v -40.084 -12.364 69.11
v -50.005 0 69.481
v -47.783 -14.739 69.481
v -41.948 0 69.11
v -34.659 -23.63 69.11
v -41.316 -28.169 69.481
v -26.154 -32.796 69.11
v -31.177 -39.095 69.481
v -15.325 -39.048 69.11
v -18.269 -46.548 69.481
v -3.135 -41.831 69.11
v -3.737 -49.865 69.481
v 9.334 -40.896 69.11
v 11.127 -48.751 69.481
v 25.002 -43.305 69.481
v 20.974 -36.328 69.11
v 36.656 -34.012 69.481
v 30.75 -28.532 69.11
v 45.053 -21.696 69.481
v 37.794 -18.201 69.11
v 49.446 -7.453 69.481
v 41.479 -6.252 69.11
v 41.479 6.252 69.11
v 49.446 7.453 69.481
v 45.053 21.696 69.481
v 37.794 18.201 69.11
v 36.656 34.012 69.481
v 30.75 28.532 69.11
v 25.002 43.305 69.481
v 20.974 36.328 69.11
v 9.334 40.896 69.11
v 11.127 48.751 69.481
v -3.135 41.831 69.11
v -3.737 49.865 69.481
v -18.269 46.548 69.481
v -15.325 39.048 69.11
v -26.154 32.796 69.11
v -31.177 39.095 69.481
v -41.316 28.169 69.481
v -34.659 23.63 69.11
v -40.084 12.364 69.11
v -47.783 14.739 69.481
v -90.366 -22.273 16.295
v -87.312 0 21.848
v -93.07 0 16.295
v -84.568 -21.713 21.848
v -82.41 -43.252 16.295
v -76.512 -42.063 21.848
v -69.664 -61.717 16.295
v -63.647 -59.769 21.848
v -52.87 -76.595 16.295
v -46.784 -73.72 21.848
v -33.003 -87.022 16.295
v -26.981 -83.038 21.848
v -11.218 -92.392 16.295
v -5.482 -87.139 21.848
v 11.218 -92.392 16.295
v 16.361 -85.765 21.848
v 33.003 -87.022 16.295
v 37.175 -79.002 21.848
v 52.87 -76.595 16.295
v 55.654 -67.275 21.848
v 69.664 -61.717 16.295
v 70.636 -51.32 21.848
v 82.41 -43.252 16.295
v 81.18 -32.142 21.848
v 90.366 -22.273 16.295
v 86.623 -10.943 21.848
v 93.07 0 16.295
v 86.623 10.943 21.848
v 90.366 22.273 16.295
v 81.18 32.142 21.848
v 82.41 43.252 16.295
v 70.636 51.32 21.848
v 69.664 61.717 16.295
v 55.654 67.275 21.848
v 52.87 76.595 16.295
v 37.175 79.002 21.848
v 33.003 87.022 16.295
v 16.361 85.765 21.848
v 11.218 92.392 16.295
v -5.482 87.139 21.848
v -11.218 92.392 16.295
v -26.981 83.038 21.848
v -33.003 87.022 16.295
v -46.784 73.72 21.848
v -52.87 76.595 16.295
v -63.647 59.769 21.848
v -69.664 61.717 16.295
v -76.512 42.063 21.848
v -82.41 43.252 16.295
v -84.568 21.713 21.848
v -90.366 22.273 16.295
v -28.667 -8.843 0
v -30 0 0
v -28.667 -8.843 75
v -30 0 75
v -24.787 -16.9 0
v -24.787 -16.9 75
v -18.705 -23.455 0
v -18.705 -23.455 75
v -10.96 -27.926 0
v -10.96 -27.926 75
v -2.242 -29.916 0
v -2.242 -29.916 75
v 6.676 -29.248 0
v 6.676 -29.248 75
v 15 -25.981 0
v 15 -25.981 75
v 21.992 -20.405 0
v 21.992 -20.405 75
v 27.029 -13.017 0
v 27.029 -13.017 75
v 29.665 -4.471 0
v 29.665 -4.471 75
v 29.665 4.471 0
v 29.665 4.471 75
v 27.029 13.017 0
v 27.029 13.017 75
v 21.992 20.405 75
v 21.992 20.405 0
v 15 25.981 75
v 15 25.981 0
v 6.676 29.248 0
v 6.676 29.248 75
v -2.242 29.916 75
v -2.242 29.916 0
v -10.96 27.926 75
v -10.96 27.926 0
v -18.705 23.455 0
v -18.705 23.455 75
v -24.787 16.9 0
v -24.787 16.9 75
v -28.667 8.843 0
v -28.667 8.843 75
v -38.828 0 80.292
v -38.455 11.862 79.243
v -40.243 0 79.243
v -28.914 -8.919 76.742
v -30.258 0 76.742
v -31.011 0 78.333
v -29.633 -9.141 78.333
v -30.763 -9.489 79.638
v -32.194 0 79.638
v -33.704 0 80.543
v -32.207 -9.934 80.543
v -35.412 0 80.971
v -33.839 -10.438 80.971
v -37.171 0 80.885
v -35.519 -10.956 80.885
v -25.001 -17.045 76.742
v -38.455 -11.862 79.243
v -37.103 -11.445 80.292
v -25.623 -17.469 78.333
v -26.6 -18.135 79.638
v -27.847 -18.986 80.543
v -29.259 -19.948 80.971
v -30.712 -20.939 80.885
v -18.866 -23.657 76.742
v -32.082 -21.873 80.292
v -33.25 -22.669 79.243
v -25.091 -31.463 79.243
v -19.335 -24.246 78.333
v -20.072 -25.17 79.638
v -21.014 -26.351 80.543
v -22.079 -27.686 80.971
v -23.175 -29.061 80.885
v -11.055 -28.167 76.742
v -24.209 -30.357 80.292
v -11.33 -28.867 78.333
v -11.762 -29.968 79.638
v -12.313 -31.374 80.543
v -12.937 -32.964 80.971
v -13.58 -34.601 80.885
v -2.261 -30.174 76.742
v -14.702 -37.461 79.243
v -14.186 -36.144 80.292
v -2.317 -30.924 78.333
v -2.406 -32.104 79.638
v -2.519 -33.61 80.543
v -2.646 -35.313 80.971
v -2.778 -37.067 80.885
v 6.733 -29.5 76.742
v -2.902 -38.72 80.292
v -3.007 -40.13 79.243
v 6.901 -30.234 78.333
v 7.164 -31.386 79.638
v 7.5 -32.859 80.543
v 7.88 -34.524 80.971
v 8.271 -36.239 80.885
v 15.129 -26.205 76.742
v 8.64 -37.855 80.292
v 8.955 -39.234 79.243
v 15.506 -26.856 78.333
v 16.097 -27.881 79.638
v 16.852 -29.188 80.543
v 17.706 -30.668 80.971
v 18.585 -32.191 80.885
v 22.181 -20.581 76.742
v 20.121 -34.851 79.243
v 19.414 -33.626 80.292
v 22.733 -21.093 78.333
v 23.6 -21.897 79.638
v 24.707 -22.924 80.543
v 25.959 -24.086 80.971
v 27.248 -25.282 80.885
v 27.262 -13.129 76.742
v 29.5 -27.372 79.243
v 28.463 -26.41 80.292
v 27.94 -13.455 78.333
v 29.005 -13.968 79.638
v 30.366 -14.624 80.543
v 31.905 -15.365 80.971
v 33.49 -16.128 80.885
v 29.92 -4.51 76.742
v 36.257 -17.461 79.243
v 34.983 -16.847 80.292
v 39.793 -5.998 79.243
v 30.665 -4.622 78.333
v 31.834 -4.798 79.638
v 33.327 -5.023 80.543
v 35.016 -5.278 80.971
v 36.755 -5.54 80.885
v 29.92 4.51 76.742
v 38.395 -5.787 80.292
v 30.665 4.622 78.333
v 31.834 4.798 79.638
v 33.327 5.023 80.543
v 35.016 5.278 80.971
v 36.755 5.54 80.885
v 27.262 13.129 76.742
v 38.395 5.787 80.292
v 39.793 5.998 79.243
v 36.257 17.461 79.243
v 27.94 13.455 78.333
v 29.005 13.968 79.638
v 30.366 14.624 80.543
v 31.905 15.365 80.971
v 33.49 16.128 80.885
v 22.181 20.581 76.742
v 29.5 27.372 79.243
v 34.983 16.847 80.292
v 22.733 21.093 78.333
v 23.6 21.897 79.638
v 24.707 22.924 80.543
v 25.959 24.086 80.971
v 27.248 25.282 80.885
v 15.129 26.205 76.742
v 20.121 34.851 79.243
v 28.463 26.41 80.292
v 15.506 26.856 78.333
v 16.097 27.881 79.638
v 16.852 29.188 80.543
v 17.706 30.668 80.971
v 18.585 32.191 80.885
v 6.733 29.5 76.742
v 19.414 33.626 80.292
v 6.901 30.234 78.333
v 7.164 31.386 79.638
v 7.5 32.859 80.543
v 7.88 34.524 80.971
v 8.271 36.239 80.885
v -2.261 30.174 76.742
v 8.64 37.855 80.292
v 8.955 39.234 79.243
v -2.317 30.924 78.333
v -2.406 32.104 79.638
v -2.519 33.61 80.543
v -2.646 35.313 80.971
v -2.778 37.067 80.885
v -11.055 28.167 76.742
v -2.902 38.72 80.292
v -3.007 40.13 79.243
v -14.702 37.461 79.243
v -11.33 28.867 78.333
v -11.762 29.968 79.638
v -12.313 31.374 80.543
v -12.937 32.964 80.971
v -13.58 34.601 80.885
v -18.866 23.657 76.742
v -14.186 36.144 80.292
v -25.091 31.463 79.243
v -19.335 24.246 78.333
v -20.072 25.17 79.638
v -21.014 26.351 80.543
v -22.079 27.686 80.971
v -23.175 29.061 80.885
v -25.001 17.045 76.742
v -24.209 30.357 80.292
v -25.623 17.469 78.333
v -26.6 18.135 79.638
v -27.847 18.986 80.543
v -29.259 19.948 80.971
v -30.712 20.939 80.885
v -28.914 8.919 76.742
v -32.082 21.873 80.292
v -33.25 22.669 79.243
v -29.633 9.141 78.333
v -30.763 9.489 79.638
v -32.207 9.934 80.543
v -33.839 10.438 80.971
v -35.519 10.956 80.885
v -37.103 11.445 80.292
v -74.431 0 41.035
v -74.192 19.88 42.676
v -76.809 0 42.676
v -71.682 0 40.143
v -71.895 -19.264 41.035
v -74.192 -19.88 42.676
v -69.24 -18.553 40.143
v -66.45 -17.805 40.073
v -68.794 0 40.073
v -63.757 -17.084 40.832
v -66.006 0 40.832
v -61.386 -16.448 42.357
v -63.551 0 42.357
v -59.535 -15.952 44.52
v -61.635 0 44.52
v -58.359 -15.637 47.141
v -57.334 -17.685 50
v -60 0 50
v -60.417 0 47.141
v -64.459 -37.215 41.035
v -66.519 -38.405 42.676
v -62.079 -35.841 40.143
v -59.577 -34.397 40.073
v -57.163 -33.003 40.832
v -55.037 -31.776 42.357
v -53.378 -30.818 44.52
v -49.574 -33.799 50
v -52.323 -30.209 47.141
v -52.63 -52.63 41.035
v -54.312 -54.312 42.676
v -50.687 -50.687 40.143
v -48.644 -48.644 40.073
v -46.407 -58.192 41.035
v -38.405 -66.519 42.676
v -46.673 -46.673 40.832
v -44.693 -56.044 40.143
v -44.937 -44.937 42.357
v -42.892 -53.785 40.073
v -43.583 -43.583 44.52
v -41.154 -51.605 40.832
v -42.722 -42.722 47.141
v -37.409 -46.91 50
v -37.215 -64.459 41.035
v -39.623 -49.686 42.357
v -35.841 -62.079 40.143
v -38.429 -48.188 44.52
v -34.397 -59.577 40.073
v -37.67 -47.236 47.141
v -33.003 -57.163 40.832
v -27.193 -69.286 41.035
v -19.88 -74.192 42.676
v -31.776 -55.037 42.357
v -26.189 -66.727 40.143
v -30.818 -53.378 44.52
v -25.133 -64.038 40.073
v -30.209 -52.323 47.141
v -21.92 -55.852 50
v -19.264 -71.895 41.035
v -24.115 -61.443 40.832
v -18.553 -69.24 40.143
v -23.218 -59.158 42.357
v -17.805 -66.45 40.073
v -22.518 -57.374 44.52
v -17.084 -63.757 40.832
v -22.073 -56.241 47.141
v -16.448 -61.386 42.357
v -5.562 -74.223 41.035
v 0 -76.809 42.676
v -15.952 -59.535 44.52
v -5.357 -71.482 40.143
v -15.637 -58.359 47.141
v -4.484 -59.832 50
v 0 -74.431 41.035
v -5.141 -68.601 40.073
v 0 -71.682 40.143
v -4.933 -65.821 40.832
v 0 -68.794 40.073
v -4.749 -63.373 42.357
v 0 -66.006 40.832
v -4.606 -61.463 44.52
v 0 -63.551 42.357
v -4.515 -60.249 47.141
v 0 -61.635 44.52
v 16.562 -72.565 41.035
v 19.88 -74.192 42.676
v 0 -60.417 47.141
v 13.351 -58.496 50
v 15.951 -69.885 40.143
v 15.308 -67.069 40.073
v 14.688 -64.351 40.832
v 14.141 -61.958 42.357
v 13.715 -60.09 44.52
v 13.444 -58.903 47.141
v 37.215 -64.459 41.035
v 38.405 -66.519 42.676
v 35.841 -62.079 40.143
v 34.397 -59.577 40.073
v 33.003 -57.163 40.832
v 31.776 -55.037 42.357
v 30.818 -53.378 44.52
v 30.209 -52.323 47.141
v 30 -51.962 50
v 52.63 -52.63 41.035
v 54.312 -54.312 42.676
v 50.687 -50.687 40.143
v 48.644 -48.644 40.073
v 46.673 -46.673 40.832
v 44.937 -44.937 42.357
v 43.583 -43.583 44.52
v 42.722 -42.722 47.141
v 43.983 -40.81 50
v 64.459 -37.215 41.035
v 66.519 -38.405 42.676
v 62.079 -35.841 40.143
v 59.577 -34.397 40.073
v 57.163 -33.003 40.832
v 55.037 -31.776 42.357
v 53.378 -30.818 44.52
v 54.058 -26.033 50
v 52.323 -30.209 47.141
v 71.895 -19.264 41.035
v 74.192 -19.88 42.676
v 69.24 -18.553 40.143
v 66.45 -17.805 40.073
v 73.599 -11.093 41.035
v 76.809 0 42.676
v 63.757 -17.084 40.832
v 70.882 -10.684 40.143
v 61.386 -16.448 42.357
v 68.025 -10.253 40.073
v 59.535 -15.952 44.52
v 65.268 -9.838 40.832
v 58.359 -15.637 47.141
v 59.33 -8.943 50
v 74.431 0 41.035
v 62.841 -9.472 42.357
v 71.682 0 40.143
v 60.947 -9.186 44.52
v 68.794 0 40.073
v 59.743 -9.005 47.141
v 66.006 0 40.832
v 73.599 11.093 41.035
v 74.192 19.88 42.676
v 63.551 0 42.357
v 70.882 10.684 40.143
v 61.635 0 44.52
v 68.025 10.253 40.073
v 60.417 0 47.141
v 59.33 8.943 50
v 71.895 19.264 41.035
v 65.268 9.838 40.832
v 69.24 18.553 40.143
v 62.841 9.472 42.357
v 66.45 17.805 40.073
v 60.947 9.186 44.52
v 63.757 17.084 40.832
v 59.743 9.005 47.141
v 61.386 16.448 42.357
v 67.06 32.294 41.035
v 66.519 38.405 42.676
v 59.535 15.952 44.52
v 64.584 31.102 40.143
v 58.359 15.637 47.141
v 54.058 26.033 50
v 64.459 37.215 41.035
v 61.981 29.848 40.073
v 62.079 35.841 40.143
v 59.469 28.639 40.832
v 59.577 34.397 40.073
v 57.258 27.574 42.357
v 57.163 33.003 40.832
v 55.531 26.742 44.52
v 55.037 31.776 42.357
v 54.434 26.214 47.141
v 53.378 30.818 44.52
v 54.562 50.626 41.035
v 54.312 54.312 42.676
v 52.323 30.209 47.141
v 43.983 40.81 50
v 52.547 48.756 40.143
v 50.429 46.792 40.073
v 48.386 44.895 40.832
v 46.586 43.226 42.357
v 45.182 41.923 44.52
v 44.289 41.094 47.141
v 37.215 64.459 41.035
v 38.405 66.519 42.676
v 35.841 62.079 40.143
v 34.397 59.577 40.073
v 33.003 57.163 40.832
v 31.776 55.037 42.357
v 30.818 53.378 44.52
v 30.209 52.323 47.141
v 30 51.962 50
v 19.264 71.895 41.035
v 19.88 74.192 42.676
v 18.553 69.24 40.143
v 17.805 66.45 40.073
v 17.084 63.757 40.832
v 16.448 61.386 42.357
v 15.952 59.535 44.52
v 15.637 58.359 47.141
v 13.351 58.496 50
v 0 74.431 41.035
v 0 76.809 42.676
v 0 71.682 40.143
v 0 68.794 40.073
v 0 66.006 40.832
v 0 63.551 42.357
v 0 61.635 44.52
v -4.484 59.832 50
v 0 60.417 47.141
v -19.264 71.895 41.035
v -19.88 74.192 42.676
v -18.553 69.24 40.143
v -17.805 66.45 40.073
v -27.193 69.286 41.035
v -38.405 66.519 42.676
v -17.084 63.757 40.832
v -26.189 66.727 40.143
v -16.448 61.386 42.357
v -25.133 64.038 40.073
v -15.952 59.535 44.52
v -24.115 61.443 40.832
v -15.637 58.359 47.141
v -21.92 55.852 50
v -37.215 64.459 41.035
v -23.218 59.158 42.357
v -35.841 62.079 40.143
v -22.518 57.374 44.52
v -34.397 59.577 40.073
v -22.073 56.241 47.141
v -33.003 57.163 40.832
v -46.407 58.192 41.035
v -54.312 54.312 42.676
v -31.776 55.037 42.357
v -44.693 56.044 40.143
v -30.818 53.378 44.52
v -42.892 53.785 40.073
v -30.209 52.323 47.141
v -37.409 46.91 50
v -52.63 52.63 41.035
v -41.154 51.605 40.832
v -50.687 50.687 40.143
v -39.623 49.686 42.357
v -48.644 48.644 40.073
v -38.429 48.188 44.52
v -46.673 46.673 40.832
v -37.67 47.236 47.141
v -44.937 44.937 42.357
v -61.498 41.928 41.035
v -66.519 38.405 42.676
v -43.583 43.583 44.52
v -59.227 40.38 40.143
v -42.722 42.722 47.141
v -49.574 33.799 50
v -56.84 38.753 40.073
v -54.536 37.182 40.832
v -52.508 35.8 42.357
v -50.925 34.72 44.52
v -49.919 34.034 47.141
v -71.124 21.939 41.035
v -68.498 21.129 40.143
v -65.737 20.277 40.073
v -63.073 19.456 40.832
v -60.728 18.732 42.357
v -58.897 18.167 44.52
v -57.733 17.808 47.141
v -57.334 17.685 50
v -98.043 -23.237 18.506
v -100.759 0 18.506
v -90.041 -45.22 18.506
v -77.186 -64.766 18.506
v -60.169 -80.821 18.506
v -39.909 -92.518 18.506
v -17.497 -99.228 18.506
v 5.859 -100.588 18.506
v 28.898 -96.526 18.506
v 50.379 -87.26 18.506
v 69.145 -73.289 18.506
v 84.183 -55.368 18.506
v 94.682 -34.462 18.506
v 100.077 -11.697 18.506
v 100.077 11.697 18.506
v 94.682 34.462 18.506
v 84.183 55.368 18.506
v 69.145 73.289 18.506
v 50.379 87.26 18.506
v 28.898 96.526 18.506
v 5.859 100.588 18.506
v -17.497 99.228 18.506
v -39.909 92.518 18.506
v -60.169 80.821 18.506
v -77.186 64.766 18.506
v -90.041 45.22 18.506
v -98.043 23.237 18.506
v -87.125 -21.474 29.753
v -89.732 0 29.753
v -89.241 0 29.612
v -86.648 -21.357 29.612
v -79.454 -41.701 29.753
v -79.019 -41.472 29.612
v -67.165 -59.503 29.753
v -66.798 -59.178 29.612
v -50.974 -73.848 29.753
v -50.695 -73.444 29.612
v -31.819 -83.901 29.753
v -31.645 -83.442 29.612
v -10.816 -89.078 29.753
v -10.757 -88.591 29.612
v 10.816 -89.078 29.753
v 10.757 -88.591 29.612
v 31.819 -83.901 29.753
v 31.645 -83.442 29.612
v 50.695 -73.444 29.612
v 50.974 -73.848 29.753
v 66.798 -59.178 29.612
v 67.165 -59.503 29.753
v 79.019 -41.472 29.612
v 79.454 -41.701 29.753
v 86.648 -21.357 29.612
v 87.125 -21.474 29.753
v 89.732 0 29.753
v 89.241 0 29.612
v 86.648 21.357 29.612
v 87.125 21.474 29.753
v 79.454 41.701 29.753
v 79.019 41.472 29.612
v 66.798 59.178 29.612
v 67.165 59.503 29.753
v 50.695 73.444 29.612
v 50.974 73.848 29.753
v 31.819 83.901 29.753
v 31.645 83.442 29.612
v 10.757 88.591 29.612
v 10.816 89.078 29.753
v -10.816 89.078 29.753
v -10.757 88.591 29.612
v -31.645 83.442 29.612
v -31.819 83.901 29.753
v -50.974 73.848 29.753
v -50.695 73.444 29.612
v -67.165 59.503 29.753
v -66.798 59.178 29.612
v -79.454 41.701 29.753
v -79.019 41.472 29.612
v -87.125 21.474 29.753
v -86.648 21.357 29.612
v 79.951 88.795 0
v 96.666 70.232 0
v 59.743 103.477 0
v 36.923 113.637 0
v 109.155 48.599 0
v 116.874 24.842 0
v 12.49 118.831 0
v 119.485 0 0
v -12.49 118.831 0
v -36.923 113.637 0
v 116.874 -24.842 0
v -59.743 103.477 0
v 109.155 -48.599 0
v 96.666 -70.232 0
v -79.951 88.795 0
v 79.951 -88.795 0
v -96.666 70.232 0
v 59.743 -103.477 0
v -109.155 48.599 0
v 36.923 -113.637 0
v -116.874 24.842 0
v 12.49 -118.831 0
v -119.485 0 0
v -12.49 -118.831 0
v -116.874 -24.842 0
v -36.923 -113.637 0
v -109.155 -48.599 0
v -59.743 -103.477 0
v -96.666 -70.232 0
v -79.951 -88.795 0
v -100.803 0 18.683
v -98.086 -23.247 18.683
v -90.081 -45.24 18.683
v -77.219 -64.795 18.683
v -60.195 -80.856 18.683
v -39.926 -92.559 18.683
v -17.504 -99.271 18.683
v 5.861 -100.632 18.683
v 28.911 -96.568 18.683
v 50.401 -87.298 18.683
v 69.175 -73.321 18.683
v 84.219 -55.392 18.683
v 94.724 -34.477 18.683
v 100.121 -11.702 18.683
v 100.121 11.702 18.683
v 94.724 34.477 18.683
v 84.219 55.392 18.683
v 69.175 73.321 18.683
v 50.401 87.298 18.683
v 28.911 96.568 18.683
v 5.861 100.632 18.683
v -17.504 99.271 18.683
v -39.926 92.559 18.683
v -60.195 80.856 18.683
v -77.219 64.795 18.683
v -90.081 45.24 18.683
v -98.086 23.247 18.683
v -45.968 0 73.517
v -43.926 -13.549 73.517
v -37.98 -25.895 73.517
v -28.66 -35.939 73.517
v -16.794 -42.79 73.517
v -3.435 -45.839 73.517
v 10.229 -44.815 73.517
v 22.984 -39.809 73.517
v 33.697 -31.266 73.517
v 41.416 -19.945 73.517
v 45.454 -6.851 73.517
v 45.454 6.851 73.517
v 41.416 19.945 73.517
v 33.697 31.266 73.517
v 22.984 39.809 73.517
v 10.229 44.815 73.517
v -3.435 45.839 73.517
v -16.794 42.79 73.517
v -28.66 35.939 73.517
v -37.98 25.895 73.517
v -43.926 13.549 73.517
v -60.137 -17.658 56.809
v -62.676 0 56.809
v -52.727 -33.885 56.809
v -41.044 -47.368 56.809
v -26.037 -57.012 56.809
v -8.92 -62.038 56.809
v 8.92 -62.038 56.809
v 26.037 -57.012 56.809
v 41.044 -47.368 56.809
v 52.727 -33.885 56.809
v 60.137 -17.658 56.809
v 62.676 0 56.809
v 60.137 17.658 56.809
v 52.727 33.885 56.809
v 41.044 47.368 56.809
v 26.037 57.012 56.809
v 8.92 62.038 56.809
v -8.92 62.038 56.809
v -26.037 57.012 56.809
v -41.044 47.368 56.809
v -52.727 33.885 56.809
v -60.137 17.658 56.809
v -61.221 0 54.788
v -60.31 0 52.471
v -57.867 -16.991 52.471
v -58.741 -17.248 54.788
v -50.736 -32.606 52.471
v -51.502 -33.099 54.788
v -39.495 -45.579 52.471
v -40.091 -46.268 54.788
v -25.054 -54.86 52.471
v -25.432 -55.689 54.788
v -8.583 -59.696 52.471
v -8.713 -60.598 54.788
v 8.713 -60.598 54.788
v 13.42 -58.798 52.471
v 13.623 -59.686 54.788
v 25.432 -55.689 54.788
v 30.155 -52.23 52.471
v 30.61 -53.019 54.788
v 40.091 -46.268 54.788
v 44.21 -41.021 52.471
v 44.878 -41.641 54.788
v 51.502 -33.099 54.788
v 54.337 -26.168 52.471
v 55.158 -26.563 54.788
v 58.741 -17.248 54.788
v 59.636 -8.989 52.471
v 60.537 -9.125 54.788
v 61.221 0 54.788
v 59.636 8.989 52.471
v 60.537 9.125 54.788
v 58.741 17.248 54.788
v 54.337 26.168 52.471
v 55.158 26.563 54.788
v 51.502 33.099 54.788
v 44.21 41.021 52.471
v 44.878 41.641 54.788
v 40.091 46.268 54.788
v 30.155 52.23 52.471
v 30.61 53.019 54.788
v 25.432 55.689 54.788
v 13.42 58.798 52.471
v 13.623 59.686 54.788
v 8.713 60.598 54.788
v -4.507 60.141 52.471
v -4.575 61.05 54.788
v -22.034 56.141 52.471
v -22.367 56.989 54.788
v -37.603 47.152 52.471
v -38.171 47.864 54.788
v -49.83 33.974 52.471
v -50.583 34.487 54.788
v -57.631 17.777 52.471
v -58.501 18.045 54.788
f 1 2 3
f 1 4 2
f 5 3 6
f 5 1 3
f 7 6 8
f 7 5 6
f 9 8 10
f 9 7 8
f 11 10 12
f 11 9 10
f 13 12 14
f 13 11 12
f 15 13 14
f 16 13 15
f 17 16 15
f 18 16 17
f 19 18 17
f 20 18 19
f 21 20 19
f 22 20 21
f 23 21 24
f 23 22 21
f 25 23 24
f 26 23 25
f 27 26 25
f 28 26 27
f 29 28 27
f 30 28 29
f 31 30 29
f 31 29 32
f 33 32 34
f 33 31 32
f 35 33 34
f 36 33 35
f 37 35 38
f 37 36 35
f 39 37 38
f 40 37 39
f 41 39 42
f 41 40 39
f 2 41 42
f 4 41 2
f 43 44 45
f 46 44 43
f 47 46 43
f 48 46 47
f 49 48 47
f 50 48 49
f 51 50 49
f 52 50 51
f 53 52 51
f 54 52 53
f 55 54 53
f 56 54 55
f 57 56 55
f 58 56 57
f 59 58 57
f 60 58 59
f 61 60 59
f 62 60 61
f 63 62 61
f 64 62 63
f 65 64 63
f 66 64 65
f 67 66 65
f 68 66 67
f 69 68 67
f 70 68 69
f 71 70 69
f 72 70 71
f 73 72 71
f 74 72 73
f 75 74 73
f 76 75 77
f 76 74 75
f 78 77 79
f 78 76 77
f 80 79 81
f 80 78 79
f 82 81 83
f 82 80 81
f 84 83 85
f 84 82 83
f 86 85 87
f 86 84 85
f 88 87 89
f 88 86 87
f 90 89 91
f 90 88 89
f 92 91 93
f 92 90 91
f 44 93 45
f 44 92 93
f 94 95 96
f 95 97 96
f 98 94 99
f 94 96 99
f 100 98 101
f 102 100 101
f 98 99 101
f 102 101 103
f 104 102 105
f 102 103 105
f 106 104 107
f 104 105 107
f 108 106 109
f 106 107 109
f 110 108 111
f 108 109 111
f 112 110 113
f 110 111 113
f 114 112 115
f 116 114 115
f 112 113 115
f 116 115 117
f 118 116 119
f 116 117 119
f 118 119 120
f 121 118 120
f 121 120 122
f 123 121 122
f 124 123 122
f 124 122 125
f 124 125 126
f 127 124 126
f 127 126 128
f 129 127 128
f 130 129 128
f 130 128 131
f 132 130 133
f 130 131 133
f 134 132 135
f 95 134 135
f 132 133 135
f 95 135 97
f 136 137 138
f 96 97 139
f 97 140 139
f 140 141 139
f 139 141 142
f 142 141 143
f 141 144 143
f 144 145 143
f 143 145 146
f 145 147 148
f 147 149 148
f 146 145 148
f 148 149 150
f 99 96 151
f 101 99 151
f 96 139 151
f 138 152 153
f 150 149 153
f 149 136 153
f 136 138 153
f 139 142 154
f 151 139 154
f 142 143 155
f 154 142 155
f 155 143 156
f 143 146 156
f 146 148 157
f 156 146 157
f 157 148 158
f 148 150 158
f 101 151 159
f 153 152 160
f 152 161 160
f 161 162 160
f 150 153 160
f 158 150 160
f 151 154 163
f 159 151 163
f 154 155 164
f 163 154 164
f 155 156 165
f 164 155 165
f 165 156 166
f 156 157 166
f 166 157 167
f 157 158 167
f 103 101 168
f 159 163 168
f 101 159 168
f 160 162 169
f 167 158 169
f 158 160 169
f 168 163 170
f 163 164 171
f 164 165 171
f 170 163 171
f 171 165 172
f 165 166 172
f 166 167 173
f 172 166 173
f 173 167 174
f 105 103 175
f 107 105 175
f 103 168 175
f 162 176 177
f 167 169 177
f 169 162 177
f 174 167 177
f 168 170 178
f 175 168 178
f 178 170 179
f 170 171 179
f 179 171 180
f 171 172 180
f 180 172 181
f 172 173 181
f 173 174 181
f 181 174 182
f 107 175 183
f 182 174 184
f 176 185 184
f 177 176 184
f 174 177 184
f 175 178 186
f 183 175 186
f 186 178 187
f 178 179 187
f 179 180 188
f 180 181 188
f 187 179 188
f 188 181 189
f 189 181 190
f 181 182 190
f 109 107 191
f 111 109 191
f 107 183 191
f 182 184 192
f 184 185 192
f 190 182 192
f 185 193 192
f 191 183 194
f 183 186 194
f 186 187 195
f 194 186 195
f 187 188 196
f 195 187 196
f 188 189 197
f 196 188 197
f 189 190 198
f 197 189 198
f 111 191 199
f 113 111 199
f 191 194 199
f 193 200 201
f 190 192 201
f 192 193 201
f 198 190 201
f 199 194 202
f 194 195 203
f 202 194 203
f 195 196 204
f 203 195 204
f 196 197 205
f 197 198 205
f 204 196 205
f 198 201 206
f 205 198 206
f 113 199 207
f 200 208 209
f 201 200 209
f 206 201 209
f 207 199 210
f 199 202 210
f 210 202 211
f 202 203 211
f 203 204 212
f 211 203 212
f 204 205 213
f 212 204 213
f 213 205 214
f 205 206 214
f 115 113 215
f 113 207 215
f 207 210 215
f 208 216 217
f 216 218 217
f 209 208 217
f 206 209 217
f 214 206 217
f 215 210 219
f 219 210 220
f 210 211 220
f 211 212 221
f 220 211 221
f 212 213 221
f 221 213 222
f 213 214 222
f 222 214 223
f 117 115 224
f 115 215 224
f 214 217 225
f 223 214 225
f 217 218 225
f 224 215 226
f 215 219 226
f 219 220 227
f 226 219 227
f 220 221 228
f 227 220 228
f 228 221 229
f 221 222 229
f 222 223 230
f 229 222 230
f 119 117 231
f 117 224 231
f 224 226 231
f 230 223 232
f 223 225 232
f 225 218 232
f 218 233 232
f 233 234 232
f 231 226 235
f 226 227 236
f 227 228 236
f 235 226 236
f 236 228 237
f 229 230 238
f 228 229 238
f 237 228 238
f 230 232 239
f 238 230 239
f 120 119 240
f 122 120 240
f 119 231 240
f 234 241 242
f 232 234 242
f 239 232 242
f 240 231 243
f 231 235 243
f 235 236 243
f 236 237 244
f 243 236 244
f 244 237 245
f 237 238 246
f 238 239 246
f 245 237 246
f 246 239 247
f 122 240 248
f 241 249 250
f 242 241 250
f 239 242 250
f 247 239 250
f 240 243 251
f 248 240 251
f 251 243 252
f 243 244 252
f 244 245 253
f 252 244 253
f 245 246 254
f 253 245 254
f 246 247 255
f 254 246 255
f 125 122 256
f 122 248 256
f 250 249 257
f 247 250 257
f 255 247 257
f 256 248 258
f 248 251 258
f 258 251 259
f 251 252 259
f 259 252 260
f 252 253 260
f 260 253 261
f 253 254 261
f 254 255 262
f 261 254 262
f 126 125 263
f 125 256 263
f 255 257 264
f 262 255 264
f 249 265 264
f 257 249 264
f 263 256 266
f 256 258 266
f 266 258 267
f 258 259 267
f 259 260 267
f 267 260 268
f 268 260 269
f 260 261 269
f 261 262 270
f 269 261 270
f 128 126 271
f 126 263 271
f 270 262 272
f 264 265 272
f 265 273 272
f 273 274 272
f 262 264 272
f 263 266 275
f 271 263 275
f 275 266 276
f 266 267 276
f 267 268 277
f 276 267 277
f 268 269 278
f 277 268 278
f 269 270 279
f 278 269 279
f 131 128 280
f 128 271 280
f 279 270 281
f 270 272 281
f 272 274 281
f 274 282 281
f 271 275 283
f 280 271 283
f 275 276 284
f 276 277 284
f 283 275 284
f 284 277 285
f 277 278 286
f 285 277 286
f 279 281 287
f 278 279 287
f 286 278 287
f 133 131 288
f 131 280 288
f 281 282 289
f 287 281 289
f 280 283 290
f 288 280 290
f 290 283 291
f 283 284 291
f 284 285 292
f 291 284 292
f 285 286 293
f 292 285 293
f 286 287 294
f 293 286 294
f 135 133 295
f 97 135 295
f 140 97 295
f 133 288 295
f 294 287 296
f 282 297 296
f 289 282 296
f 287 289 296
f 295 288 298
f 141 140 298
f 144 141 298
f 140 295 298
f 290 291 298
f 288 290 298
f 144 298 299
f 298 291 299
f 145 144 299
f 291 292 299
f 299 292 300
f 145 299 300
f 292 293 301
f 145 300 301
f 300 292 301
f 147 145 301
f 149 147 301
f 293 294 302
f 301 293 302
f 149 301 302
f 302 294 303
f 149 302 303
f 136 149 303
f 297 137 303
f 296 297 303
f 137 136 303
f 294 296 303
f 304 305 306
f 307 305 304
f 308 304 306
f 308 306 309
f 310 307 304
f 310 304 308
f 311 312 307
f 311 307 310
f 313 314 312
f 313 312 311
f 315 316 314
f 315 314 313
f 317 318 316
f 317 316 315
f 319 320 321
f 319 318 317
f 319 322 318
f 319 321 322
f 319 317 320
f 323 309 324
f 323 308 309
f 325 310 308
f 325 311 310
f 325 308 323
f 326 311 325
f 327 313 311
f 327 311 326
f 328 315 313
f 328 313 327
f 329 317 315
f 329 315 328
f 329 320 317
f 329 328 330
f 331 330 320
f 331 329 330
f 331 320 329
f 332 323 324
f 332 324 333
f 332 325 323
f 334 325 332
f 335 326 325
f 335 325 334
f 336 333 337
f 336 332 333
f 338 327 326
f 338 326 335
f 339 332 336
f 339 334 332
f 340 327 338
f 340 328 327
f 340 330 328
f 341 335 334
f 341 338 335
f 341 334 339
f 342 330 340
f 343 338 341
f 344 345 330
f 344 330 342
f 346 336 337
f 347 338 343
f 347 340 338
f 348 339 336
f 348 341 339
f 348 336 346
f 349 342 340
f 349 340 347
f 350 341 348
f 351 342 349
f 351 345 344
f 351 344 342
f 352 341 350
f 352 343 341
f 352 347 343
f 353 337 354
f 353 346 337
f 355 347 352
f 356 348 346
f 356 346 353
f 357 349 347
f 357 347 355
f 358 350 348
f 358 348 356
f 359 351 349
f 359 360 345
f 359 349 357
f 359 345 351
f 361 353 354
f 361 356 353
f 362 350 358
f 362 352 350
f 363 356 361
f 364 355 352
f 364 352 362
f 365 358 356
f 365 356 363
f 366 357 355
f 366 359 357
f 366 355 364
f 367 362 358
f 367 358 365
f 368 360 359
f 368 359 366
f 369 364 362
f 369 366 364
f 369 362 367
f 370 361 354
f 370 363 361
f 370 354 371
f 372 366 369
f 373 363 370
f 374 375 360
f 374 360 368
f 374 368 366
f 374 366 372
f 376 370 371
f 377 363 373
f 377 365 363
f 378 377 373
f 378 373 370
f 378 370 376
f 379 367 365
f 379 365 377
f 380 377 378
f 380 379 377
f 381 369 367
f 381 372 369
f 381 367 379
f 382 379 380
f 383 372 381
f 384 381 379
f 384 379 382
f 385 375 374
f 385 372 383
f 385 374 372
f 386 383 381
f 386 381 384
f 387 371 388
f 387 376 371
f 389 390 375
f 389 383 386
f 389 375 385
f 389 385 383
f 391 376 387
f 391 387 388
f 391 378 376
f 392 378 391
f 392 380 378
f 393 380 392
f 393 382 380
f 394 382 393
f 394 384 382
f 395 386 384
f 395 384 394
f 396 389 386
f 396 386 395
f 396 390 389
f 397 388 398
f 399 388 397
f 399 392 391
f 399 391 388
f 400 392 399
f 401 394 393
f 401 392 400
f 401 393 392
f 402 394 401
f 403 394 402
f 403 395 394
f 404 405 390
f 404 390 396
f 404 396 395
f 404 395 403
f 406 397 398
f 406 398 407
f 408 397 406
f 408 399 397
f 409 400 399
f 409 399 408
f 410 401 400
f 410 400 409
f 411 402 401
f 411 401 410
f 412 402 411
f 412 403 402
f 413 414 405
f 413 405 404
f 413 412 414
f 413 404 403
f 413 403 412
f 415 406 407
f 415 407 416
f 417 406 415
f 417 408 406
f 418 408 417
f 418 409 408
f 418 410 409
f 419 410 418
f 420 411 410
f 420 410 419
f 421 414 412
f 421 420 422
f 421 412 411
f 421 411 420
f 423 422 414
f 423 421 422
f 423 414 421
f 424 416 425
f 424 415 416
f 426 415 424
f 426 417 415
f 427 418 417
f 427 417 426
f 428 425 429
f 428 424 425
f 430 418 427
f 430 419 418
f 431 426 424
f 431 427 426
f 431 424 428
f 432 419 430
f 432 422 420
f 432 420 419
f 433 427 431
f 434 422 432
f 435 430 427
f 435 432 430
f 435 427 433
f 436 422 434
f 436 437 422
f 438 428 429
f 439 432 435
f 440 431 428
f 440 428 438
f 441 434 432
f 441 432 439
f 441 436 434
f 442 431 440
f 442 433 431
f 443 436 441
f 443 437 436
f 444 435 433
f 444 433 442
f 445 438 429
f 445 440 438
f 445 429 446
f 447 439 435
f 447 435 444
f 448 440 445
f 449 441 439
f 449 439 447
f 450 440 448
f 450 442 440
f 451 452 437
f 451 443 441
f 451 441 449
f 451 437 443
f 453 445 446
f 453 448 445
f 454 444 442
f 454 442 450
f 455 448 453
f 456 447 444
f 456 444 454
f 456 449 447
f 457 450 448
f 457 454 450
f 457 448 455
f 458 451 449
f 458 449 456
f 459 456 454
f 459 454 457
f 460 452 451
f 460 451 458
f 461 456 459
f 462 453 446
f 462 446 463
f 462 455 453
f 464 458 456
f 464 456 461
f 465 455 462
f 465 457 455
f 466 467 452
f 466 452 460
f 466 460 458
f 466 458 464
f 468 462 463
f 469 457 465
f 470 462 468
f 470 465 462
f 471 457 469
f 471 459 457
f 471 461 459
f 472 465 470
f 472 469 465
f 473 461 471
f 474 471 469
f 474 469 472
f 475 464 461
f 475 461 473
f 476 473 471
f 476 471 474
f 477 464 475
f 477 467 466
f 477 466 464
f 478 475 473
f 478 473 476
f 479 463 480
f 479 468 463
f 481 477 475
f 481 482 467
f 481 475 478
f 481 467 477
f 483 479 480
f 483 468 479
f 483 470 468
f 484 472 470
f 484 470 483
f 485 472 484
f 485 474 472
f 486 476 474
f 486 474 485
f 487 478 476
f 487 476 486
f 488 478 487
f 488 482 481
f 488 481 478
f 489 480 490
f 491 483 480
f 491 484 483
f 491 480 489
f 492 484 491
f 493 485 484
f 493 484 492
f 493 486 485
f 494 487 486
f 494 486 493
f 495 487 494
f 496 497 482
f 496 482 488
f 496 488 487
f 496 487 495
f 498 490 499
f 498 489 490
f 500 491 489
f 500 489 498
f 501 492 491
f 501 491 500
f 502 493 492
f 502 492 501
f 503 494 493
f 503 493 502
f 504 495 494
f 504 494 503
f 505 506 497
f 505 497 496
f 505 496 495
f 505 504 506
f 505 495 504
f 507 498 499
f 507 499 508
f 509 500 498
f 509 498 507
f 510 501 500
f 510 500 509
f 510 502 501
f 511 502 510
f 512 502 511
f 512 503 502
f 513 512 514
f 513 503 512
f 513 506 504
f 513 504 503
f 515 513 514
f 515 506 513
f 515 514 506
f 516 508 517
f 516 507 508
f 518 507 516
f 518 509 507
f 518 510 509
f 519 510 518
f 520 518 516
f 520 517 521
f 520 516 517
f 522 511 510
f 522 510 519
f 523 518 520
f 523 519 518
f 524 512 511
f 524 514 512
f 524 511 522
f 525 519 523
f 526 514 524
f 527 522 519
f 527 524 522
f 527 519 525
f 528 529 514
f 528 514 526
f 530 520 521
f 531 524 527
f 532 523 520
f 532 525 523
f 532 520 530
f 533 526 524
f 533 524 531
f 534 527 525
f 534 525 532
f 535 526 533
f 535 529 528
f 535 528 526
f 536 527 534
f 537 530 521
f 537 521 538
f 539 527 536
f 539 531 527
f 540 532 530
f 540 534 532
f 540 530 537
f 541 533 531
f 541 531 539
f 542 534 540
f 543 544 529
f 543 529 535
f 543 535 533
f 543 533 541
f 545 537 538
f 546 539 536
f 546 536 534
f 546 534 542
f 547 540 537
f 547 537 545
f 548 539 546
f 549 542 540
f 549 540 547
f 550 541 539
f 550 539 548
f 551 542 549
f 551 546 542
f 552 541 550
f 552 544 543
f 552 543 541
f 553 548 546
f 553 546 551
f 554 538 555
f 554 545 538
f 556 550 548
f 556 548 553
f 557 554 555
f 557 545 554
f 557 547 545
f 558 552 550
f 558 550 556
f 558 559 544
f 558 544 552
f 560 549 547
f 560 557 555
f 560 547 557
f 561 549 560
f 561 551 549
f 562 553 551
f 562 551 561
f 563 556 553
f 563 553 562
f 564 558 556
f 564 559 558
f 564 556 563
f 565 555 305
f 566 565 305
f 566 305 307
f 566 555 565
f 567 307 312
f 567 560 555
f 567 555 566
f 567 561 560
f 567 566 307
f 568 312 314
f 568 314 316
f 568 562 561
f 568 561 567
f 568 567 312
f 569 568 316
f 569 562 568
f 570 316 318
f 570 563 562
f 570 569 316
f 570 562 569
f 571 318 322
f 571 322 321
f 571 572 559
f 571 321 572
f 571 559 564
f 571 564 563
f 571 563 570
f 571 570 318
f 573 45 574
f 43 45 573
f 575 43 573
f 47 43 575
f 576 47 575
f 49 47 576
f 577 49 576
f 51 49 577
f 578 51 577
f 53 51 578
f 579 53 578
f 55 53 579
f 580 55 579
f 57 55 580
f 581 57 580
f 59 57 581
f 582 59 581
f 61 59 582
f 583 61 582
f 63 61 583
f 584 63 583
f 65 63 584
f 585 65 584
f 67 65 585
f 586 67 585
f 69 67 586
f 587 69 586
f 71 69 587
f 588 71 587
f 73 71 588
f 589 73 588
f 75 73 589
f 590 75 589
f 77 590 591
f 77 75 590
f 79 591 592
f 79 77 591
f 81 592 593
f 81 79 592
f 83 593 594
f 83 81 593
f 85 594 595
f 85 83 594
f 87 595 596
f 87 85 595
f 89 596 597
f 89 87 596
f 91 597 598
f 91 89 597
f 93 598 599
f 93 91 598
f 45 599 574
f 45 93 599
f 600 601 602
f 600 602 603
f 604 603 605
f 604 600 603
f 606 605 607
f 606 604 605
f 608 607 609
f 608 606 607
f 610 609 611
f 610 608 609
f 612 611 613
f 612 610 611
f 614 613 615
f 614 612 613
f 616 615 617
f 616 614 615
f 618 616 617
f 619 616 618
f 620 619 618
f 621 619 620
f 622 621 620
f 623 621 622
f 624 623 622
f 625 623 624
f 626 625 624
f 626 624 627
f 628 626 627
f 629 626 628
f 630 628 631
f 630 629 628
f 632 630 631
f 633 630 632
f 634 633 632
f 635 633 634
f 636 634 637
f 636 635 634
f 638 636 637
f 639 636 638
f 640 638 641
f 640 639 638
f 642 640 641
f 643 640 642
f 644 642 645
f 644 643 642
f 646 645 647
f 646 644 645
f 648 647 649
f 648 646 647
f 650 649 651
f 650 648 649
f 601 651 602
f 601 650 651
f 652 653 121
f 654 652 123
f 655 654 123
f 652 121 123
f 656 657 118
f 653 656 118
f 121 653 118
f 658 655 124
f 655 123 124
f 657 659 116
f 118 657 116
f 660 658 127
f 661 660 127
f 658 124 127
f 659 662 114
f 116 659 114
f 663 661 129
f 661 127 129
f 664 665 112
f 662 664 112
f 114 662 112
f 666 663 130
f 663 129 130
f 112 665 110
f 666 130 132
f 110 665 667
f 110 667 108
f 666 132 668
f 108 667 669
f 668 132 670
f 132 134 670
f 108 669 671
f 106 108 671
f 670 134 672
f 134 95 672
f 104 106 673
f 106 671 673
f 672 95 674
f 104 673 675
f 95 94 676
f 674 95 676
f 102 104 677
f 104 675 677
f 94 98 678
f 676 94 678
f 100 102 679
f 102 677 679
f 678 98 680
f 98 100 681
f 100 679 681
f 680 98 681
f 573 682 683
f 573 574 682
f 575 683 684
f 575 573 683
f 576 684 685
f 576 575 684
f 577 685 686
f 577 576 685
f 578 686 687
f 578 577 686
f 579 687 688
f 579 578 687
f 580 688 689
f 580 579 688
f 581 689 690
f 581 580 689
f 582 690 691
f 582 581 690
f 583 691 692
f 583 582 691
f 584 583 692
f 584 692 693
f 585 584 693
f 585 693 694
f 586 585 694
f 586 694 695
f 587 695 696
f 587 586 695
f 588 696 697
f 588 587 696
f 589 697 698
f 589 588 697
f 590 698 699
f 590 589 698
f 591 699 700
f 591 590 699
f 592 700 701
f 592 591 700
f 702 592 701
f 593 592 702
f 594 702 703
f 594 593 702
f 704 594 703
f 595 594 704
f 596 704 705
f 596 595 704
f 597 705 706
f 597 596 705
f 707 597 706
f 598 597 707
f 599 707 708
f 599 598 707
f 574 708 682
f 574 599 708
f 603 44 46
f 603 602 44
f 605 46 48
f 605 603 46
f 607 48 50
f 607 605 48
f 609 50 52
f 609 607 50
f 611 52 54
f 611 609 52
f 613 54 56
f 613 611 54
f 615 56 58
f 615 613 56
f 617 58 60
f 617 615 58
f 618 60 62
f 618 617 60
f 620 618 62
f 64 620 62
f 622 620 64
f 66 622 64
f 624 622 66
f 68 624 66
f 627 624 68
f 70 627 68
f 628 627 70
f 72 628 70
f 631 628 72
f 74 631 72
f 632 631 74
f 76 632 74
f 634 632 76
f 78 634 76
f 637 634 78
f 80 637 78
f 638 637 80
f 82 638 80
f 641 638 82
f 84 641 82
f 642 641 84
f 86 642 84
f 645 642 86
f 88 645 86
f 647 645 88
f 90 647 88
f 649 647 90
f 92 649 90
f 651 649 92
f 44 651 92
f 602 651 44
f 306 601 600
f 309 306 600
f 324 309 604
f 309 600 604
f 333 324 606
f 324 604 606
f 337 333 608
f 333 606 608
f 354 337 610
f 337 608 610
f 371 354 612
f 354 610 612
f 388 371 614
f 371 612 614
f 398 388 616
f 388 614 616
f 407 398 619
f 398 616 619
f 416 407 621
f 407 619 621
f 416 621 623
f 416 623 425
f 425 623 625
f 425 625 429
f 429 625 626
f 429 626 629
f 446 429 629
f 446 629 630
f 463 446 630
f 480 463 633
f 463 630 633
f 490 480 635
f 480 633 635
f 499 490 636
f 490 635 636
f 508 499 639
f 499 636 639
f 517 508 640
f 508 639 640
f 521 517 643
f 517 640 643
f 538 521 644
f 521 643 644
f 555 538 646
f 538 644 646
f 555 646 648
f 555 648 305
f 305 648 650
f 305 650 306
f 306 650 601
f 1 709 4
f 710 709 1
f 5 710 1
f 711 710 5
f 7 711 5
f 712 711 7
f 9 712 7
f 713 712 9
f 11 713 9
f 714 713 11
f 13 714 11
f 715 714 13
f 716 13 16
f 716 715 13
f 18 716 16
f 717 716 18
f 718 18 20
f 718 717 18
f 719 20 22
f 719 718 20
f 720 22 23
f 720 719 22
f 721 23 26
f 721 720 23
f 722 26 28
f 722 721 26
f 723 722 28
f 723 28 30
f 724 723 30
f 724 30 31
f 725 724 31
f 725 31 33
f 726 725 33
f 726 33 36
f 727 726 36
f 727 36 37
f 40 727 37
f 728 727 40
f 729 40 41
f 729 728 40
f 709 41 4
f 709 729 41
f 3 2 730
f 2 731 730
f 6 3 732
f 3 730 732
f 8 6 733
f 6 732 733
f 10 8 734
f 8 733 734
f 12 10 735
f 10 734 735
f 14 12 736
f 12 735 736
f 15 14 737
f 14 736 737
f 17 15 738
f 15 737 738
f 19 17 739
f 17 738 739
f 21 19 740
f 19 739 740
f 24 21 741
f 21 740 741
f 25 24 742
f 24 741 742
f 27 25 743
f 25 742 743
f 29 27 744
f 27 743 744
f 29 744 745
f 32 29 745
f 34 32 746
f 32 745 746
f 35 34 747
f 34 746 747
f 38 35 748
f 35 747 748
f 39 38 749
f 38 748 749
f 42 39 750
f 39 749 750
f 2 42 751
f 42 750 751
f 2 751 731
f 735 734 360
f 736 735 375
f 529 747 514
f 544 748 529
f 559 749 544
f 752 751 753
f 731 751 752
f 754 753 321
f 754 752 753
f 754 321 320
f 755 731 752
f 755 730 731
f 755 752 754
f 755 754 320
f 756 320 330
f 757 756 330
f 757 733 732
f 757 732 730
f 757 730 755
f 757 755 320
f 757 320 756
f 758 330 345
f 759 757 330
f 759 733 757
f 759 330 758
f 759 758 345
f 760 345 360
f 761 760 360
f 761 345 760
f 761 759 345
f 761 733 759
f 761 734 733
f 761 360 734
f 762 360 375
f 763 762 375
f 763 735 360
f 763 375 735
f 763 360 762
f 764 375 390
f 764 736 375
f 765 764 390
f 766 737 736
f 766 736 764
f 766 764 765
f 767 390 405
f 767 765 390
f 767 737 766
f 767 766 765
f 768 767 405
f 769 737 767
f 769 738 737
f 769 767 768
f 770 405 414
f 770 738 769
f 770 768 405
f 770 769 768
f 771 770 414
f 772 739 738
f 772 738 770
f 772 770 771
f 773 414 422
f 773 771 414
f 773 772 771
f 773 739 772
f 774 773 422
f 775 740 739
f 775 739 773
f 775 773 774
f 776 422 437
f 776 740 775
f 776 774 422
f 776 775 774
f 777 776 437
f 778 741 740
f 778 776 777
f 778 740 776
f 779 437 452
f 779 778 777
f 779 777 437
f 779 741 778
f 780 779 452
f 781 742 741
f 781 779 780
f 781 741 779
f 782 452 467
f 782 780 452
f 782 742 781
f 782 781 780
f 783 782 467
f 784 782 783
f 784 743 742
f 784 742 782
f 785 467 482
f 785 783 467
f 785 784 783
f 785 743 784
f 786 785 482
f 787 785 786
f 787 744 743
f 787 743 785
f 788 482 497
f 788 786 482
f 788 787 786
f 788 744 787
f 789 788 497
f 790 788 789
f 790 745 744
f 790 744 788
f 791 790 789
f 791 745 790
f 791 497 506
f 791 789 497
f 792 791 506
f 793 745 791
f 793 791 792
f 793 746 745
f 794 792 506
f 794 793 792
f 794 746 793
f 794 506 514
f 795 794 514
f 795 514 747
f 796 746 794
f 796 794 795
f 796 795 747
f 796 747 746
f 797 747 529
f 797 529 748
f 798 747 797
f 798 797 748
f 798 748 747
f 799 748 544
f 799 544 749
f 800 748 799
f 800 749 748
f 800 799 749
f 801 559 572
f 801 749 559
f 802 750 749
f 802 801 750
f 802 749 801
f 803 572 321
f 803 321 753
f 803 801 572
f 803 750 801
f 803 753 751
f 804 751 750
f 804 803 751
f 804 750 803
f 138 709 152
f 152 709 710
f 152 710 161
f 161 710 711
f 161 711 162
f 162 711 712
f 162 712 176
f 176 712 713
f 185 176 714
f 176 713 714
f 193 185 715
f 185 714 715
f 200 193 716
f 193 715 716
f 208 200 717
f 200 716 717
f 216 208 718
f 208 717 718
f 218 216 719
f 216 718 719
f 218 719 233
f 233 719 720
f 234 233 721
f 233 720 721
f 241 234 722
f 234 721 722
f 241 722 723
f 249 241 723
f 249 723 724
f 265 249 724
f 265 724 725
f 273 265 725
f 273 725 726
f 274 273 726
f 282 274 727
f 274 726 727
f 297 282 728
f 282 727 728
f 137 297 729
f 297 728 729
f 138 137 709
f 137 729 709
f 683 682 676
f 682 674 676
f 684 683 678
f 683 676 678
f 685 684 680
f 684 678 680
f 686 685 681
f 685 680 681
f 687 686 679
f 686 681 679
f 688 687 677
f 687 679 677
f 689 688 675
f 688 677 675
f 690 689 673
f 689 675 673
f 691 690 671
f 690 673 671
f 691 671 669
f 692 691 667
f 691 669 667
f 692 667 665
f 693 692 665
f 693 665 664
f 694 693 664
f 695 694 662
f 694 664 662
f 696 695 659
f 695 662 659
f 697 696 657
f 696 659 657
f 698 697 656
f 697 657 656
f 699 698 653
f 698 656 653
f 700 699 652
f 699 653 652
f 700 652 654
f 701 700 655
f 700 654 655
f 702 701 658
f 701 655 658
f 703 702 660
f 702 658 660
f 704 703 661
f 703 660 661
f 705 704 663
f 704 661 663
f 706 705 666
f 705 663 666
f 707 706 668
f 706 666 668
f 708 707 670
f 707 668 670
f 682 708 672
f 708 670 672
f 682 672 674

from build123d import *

# Parameters (mm, degrees)
F2_R = 10


with BuildPart() as f1:
    # F0 (on Front) → F1 (revolve)
    with BuildSketch(Plane.XZ):
        with BuildLine():
            Line((-119.4852813742, 0), (-30, 0))
            Line((-30, 0), (-30, 75))
            ThreePointArc((-30, 75), (-33.7038994058, 80.5432771951), (-40.2426406871, 79.2426406871))
            Line((-40.2426406871, 79.2426406871), (-119.4852813742, 0))
        make_face()
    revolve(axis=Axis((0, 0, 44.6021817625), (0, 0, 1)))

    # F2 (on Front) → F3 (revolve, cut)
    with BuildSketch(Plane.XZ):
        with Locations((-70, 50)):
            Circle(F2_R)
    revolve(axis=Axis((0, 0, 44.2256368697), (0, 0, 1)), mode=Mode.SUBTRACT)

    # F4 (on Front) → F5 (revolve, cut)
    with BuildSketch(Plane.XZ):
        Polygon((-93.070267659, 16.2951581671), (-87.3115113074, 21.84824067), (-89.2412436485, 29.6120112161), (-96.929732341, 31.8226992593), (-102.6884886926, 26.2696167564), (-100.7587563515, 18.5058462103), align=None)
    revolve(axis=Axis((0, 0, 44.7207018733), (0, 0, 1)), mode=Mode.SUBTRACT)

    # F6 (on Front) → F7 (revolve, cut)
    with BuildSketch(Plane.XZ):
        Polygon((-50.2399520095, 78.2016961205), (-50.6398090678, 69.5098518968), (-41.9479648441, 69.1099948385), align=None)
    revolve(axis=Axis((0, 0, 44.9002496898), (0, 0, 1)), mode=Mode.SUBTRACT)


solid = f1.part
